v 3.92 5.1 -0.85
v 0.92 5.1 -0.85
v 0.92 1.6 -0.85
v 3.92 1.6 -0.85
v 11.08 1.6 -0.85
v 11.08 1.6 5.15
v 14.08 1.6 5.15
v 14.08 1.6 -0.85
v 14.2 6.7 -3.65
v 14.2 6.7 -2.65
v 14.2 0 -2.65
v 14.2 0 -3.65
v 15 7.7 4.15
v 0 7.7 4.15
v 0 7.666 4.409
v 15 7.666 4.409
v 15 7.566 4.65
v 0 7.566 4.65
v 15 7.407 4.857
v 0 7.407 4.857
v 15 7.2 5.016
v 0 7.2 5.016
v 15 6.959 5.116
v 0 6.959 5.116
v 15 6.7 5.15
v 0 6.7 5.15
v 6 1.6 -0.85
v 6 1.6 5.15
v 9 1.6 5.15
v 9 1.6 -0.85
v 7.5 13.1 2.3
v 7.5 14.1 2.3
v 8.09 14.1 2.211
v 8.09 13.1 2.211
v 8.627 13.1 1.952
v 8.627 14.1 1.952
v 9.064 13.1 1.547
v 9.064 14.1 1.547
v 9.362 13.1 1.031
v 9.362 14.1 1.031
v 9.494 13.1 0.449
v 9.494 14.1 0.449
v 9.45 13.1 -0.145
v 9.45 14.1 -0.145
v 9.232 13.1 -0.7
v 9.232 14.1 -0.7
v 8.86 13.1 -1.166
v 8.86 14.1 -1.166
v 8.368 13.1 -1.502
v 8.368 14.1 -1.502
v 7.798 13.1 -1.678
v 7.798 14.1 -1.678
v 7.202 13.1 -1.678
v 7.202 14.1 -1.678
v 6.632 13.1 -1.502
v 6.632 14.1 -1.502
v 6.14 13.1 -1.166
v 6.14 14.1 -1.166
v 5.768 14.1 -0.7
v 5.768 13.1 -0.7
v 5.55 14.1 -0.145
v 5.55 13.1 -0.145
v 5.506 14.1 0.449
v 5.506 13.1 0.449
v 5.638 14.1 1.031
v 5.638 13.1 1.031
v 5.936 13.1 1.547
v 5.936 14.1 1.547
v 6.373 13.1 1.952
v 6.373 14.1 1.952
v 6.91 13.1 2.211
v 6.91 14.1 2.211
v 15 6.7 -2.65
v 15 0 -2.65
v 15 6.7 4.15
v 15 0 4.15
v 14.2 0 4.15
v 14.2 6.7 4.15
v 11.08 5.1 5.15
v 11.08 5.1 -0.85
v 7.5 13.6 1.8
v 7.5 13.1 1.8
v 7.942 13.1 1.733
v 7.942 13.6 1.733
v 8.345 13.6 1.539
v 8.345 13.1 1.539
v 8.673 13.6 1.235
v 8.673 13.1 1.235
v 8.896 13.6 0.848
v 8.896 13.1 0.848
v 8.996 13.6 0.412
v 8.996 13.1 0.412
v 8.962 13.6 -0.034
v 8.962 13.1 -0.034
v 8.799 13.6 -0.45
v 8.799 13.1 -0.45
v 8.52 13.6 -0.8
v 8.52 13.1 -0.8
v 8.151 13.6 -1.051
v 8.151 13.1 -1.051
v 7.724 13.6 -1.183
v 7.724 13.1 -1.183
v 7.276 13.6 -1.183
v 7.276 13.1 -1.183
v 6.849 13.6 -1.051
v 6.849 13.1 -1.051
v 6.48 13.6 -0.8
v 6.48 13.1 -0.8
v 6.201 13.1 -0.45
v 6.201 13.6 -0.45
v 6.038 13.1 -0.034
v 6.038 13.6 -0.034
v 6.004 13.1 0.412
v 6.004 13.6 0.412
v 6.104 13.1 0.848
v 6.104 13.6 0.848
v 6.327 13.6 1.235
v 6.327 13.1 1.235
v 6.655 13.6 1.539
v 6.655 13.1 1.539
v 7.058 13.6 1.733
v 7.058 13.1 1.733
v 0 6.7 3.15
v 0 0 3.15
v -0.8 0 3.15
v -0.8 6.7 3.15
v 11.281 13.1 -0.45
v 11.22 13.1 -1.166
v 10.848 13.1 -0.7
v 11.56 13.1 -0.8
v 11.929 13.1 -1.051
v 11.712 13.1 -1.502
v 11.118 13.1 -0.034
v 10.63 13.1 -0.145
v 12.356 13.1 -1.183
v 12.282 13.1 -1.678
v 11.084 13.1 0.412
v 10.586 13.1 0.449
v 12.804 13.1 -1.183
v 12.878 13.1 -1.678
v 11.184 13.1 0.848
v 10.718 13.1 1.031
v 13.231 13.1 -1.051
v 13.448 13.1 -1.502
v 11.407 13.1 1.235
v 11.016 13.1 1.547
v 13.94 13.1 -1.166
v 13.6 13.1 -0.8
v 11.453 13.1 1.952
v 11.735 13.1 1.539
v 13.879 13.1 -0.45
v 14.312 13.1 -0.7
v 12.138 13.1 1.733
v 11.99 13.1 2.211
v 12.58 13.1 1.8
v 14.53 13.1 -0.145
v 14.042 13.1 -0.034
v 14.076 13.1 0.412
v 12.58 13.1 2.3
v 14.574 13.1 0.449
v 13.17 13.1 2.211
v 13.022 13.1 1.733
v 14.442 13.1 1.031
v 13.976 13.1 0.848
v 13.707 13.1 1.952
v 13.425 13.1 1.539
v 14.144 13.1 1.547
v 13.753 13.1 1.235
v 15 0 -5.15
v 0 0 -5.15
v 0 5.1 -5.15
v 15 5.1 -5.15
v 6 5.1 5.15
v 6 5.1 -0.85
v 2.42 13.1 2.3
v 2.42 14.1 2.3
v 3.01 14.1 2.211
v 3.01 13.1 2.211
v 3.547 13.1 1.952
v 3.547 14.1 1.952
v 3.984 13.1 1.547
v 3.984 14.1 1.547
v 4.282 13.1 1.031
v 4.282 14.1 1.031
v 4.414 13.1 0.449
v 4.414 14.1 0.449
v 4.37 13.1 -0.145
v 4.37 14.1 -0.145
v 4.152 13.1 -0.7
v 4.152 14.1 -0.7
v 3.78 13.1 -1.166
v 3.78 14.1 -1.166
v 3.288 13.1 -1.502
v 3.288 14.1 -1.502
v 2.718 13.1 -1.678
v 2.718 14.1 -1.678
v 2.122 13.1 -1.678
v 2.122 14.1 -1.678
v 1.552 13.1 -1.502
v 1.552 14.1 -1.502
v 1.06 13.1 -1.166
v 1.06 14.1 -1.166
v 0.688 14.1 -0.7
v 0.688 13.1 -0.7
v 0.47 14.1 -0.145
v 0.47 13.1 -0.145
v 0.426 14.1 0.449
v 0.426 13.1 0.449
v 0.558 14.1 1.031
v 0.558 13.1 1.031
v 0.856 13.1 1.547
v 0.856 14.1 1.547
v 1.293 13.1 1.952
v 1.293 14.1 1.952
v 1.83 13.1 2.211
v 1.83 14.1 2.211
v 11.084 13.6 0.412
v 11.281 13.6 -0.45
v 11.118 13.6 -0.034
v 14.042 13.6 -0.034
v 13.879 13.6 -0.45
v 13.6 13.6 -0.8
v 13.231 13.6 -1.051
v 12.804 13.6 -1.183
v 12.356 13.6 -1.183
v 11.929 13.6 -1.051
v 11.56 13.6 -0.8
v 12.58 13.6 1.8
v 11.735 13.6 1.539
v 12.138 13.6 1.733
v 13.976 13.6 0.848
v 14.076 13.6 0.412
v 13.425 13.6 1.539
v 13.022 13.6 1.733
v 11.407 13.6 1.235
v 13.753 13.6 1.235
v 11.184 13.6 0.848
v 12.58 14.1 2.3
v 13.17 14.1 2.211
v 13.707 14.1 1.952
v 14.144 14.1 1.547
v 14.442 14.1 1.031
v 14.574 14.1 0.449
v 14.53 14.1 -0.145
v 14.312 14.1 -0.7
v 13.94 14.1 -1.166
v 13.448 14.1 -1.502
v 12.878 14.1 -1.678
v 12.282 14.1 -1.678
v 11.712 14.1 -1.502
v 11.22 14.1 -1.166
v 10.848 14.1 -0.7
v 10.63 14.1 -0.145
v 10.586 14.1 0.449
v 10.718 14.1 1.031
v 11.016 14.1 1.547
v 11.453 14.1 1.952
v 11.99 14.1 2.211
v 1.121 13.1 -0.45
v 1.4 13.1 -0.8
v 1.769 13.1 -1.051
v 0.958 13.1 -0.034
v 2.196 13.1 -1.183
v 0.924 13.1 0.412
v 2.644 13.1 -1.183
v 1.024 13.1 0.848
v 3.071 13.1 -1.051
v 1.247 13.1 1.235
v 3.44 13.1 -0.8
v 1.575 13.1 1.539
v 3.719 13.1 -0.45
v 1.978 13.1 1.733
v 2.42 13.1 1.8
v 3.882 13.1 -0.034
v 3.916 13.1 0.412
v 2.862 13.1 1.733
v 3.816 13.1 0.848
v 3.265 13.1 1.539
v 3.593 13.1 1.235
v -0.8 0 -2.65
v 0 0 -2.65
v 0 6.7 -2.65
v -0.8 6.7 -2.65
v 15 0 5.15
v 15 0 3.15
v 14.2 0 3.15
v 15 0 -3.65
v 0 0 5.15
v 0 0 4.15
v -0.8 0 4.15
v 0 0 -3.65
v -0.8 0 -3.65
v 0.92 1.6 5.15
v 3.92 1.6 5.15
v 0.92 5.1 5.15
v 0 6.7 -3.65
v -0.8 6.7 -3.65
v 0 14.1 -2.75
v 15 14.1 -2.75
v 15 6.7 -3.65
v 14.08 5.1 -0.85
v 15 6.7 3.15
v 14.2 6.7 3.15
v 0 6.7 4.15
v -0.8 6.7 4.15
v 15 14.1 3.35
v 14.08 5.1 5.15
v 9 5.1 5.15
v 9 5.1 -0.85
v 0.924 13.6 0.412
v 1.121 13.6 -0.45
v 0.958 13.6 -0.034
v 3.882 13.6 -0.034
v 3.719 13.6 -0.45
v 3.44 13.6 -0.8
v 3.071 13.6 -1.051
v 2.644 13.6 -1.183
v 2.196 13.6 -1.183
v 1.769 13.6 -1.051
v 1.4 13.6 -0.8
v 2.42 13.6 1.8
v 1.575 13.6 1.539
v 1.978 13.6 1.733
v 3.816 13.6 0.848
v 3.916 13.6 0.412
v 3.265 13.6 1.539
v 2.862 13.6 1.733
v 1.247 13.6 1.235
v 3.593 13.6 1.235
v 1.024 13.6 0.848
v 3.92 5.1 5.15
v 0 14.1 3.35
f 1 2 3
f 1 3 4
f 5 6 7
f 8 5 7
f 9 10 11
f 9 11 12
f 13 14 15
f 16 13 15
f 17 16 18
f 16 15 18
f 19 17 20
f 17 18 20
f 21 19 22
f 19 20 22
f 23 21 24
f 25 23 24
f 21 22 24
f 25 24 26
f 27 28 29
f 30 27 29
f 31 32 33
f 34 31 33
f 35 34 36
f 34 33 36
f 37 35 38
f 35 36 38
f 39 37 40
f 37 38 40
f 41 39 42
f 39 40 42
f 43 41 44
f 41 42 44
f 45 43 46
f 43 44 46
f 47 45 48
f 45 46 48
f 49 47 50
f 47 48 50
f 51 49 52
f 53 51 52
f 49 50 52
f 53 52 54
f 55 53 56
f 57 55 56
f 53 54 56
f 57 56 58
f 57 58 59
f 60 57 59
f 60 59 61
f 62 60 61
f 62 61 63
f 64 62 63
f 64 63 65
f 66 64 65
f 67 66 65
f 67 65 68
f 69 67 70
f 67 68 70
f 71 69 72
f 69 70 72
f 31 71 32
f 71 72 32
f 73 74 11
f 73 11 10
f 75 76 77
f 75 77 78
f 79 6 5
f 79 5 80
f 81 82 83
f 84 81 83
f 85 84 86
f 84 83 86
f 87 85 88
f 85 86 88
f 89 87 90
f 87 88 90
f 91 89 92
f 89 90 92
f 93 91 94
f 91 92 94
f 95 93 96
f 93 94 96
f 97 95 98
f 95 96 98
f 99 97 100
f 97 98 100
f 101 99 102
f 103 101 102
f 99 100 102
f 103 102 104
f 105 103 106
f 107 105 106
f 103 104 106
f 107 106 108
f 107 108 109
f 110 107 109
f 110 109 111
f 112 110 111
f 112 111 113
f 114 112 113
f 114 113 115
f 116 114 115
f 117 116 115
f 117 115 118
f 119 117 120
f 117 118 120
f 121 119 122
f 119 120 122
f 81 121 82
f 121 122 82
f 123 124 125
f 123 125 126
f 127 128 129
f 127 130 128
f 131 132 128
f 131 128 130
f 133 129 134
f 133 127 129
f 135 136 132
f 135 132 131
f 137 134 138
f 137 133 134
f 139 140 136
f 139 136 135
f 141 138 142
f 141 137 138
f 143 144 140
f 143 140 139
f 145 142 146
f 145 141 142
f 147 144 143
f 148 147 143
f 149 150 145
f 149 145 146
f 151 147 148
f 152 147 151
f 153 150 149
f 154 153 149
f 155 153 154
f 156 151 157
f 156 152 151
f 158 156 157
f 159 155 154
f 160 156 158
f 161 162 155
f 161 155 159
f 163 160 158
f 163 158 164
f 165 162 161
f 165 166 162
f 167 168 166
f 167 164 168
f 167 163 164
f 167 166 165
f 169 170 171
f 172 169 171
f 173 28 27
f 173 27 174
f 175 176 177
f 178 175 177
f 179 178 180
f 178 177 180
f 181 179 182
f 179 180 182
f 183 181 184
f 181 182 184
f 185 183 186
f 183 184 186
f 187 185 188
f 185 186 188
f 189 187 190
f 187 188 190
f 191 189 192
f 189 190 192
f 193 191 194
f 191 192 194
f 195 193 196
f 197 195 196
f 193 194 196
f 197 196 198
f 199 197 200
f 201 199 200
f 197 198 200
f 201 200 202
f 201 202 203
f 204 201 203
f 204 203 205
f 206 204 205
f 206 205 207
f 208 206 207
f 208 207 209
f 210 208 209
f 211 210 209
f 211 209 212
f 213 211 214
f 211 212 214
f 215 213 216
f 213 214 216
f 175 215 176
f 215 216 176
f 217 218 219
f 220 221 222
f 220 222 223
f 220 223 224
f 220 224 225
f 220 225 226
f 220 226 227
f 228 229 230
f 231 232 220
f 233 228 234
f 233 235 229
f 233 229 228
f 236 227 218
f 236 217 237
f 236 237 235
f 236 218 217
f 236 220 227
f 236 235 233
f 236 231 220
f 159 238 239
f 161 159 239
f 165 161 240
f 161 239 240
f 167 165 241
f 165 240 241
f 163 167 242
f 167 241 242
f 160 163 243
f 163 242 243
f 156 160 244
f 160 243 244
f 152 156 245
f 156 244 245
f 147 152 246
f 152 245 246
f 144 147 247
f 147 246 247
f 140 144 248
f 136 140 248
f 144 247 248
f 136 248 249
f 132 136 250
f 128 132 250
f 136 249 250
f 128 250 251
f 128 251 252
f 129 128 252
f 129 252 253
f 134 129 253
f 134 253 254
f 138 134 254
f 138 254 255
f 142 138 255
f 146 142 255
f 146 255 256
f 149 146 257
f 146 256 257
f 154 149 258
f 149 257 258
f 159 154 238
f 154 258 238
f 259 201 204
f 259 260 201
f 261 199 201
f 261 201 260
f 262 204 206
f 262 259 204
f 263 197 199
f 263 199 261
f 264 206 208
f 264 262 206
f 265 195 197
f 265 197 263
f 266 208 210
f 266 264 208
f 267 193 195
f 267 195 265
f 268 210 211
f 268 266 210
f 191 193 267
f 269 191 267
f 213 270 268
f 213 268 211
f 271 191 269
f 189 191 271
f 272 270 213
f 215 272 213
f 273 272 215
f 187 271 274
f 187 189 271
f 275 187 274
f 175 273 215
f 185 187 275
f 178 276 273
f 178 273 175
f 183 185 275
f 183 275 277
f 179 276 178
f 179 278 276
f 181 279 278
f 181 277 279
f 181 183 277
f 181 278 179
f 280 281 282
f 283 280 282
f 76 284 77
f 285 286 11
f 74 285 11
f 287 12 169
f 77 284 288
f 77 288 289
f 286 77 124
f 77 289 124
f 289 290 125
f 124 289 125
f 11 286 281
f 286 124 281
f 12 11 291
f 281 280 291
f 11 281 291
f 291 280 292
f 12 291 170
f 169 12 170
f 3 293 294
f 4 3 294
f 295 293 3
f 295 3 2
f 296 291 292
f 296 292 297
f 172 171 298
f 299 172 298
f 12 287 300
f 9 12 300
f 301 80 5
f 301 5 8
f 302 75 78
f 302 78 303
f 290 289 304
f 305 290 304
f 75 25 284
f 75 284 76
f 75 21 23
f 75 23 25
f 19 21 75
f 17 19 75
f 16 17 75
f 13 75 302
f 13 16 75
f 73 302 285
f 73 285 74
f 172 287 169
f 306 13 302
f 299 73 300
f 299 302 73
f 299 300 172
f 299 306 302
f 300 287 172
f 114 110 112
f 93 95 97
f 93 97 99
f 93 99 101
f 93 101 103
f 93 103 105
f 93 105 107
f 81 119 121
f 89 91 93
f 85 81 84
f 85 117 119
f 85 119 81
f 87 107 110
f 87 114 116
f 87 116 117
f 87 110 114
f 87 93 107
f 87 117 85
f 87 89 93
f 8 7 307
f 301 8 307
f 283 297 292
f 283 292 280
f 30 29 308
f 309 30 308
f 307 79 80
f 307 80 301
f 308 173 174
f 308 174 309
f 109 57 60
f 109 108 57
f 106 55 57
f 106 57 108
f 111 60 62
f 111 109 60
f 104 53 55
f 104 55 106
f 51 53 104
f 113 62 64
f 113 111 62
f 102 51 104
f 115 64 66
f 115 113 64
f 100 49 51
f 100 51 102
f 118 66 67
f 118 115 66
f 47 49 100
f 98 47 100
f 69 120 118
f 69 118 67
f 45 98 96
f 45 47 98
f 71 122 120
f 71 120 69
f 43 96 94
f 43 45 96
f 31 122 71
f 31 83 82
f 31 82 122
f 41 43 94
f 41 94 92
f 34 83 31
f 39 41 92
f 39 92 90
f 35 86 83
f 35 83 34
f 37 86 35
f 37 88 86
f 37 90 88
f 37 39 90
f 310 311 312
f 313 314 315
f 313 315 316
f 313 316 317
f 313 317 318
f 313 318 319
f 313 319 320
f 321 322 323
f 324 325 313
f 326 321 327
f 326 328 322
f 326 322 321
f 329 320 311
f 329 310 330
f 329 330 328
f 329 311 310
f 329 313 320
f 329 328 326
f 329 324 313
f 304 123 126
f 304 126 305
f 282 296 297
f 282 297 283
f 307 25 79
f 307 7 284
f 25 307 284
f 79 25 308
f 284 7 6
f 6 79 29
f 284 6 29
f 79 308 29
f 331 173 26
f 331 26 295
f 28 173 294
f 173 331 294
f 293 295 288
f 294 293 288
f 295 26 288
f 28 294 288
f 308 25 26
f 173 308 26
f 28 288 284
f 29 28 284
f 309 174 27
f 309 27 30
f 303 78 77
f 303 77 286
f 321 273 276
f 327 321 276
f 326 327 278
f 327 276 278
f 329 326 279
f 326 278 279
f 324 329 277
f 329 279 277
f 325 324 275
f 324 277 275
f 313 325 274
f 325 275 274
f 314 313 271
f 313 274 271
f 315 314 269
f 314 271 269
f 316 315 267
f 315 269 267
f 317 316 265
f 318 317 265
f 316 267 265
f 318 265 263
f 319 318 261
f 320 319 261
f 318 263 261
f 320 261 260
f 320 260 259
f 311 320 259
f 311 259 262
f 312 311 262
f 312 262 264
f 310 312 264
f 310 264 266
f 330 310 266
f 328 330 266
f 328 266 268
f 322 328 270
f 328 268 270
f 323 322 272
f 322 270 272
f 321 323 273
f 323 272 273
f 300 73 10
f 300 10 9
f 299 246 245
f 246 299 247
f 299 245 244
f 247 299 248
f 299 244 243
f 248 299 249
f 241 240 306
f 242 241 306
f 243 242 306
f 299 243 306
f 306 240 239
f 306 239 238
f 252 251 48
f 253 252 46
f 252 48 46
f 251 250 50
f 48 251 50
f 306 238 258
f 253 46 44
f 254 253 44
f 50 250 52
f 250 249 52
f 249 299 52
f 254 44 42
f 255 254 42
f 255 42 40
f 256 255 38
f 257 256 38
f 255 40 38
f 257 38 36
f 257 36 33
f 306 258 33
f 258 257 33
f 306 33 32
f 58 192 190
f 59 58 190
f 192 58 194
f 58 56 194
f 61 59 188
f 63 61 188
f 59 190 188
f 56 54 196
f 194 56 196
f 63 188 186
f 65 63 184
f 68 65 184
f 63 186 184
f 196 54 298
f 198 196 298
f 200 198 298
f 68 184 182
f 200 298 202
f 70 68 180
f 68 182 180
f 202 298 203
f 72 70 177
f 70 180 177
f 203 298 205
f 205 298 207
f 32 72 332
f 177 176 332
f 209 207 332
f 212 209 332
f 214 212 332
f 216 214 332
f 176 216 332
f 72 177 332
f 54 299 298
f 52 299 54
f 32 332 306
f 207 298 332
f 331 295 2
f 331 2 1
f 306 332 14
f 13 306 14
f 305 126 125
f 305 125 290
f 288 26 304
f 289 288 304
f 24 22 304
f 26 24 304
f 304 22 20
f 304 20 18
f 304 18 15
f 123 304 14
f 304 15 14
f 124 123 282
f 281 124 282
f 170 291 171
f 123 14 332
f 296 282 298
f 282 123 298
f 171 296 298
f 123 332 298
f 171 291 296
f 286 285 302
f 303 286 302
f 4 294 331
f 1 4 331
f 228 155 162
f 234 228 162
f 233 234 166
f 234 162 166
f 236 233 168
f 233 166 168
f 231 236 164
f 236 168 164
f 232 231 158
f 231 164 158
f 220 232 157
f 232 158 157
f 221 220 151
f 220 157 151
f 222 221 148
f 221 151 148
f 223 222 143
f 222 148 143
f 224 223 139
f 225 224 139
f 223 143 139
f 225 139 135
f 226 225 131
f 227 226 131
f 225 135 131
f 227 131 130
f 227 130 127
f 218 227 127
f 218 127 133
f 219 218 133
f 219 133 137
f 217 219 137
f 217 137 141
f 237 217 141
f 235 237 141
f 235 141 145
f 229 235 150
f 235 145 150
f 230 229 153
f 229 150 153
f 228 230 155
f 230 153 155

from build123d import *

# Parameters (mm, degrees)
BOSS_EXTRUDE2_DEPTH = 15
SKETCH4_R           = 2
CUT_EXTRUDE1_DEPTH  = 1
SKETCH5_R           = 1.5
BOSS_EXTRUDE3_DEPTH = 0.5
SKETCH7_W           = 3
SKETCH7_H           = 3.5
CUT_EXTRUDE2_DEPTH  = 6
LPATTERN1_COUNT     = 3
LPATTERN1_PITCH     = 5.08
SKETCH8_W           = 1
SKETCH8_H           = 6.7
BOSS_EXTRUDE4_DEPTH = 0.8
SKETCH9_W           = 1
SKETCH9_H           = 6.7
CUT_EXTRUDE3_DEPTH  = 0.8


with BuildPart() as part:
    # Sketch3 → Boss-Extrude2 (new body)
    with BuildSketch(Plane(origin=(0, 0, 0), x_dir=(0, 0, -1), z_dir=(1, 0, 0))):
        with BuildLine():
            Line((-5.15, 0), (5.15, 0))
            Line((5.15, 0), (5.15, 5.1))
            Line((5.15, 5.1), (2.75, 14.1))
            Line((2.75, 14.1), (-3.35, 14.1))
            Line((-3.35, 14.1), (-4.15, 7.7))
            ThreePointArc((-4.15, 7.7), (-4.857106781, 7.407106781), (-5.15, 6.7))
            Line((-5.15, 6.7), (-5.15, 0))
        make_face()
    extrude(amount=BOSS_EXTRUDE2_DEPTH)

    # Sketch4 → Cut-Extrude1 (cut)
    with BuildSketch(Plane(origin=(0, 14.1, 0), x_dir=(1, 0, 0), z_dir=(0, 1, 0))):
        with Locations(Location((7.5, -0.3, 0), (0, 0, 270))):
            Circle(SKETCH4_R)
    cut_extrude1 = extrude(amount=-CUT_EXTRUDE1_DEPTH, mode=Mode.SUBTRACT)

    # Sketch5 → Boss-Extrude3 (add)
    with BuildSketch(Plane(origin=(0, 13.1, 0), x_dir=(1, 0, 0), z_dir=(0, 1, 0))):
        with Locations(Location((7.5, -0.3, 0), (0, 0, 270))):
            Circle(SKETCH5_R)
    boss_extrude3 = extrude(amount=BOSS_EXTRUDE3_DEPTH)

    # Sketch-Pattern1: Cut-Extrude1, Boss-Extrude3 at 2 more places
    with Locations((5.08, 0, 0), (-5.08, 0, 0)):
        add(cut_extrude1, mode=Mode.SUBTRACT)
        add(boss_extrude3)

    # Sketch7 → Cut-Extrude2 (cut)
    with BuildSketch(Plane.XY.offset(5.15)):
        with Locations((12.58, 3.35)):
            Rectangle(SKETCH7_W, SKETCH7_H)
    cut_extrude2 = extrude(amount=-CUT_EXTRUDE2_DEPTH, mode=Mode.SUBTRACT)

    # LPattern1: Cut-Extrude2 ×3
    with Locations(*[(-i * LPATTERN1_PITCH, 0, 0) for i in range(1, LPATTERN1_COUNT)]):
        add(cut_extrude2, mode=Mode.SUBTRACT)

    # Sketch8 → Boss-Extrude4 (add)
    with BuildSketch(Plane.ZY):
        with Locations((3.65, 3.35)):
            Rectangle(SKETCH8_W, SKETCH8_H)
        with Locations((-3.15, 3.35)):
            Rectangle(SKETCH8_W, SKETCH8_H)
    extrude(amount=BOSS_EXTRUDE4_DEPTH)

    # Sketch9 → Cut-Extrude3 (cut)
    with BuildSketch(Plane(origin=(15, 0, 0), x_dir=(0, 0, -1), z_dir=(1, 0, 0))):
        with Locations((3.15, 3.35)):
            Rectangle(SKETCH9_W, SKETCH9_H)
        with Locations((-3.65, 3.35)):
            Rectangle(SKETCH9_W, SKETCH9_H)
    extrude(amount=-CUT_EXTRUDE3_DEPTH, mode=Mode.SUBTRACT)


solid = part.part
